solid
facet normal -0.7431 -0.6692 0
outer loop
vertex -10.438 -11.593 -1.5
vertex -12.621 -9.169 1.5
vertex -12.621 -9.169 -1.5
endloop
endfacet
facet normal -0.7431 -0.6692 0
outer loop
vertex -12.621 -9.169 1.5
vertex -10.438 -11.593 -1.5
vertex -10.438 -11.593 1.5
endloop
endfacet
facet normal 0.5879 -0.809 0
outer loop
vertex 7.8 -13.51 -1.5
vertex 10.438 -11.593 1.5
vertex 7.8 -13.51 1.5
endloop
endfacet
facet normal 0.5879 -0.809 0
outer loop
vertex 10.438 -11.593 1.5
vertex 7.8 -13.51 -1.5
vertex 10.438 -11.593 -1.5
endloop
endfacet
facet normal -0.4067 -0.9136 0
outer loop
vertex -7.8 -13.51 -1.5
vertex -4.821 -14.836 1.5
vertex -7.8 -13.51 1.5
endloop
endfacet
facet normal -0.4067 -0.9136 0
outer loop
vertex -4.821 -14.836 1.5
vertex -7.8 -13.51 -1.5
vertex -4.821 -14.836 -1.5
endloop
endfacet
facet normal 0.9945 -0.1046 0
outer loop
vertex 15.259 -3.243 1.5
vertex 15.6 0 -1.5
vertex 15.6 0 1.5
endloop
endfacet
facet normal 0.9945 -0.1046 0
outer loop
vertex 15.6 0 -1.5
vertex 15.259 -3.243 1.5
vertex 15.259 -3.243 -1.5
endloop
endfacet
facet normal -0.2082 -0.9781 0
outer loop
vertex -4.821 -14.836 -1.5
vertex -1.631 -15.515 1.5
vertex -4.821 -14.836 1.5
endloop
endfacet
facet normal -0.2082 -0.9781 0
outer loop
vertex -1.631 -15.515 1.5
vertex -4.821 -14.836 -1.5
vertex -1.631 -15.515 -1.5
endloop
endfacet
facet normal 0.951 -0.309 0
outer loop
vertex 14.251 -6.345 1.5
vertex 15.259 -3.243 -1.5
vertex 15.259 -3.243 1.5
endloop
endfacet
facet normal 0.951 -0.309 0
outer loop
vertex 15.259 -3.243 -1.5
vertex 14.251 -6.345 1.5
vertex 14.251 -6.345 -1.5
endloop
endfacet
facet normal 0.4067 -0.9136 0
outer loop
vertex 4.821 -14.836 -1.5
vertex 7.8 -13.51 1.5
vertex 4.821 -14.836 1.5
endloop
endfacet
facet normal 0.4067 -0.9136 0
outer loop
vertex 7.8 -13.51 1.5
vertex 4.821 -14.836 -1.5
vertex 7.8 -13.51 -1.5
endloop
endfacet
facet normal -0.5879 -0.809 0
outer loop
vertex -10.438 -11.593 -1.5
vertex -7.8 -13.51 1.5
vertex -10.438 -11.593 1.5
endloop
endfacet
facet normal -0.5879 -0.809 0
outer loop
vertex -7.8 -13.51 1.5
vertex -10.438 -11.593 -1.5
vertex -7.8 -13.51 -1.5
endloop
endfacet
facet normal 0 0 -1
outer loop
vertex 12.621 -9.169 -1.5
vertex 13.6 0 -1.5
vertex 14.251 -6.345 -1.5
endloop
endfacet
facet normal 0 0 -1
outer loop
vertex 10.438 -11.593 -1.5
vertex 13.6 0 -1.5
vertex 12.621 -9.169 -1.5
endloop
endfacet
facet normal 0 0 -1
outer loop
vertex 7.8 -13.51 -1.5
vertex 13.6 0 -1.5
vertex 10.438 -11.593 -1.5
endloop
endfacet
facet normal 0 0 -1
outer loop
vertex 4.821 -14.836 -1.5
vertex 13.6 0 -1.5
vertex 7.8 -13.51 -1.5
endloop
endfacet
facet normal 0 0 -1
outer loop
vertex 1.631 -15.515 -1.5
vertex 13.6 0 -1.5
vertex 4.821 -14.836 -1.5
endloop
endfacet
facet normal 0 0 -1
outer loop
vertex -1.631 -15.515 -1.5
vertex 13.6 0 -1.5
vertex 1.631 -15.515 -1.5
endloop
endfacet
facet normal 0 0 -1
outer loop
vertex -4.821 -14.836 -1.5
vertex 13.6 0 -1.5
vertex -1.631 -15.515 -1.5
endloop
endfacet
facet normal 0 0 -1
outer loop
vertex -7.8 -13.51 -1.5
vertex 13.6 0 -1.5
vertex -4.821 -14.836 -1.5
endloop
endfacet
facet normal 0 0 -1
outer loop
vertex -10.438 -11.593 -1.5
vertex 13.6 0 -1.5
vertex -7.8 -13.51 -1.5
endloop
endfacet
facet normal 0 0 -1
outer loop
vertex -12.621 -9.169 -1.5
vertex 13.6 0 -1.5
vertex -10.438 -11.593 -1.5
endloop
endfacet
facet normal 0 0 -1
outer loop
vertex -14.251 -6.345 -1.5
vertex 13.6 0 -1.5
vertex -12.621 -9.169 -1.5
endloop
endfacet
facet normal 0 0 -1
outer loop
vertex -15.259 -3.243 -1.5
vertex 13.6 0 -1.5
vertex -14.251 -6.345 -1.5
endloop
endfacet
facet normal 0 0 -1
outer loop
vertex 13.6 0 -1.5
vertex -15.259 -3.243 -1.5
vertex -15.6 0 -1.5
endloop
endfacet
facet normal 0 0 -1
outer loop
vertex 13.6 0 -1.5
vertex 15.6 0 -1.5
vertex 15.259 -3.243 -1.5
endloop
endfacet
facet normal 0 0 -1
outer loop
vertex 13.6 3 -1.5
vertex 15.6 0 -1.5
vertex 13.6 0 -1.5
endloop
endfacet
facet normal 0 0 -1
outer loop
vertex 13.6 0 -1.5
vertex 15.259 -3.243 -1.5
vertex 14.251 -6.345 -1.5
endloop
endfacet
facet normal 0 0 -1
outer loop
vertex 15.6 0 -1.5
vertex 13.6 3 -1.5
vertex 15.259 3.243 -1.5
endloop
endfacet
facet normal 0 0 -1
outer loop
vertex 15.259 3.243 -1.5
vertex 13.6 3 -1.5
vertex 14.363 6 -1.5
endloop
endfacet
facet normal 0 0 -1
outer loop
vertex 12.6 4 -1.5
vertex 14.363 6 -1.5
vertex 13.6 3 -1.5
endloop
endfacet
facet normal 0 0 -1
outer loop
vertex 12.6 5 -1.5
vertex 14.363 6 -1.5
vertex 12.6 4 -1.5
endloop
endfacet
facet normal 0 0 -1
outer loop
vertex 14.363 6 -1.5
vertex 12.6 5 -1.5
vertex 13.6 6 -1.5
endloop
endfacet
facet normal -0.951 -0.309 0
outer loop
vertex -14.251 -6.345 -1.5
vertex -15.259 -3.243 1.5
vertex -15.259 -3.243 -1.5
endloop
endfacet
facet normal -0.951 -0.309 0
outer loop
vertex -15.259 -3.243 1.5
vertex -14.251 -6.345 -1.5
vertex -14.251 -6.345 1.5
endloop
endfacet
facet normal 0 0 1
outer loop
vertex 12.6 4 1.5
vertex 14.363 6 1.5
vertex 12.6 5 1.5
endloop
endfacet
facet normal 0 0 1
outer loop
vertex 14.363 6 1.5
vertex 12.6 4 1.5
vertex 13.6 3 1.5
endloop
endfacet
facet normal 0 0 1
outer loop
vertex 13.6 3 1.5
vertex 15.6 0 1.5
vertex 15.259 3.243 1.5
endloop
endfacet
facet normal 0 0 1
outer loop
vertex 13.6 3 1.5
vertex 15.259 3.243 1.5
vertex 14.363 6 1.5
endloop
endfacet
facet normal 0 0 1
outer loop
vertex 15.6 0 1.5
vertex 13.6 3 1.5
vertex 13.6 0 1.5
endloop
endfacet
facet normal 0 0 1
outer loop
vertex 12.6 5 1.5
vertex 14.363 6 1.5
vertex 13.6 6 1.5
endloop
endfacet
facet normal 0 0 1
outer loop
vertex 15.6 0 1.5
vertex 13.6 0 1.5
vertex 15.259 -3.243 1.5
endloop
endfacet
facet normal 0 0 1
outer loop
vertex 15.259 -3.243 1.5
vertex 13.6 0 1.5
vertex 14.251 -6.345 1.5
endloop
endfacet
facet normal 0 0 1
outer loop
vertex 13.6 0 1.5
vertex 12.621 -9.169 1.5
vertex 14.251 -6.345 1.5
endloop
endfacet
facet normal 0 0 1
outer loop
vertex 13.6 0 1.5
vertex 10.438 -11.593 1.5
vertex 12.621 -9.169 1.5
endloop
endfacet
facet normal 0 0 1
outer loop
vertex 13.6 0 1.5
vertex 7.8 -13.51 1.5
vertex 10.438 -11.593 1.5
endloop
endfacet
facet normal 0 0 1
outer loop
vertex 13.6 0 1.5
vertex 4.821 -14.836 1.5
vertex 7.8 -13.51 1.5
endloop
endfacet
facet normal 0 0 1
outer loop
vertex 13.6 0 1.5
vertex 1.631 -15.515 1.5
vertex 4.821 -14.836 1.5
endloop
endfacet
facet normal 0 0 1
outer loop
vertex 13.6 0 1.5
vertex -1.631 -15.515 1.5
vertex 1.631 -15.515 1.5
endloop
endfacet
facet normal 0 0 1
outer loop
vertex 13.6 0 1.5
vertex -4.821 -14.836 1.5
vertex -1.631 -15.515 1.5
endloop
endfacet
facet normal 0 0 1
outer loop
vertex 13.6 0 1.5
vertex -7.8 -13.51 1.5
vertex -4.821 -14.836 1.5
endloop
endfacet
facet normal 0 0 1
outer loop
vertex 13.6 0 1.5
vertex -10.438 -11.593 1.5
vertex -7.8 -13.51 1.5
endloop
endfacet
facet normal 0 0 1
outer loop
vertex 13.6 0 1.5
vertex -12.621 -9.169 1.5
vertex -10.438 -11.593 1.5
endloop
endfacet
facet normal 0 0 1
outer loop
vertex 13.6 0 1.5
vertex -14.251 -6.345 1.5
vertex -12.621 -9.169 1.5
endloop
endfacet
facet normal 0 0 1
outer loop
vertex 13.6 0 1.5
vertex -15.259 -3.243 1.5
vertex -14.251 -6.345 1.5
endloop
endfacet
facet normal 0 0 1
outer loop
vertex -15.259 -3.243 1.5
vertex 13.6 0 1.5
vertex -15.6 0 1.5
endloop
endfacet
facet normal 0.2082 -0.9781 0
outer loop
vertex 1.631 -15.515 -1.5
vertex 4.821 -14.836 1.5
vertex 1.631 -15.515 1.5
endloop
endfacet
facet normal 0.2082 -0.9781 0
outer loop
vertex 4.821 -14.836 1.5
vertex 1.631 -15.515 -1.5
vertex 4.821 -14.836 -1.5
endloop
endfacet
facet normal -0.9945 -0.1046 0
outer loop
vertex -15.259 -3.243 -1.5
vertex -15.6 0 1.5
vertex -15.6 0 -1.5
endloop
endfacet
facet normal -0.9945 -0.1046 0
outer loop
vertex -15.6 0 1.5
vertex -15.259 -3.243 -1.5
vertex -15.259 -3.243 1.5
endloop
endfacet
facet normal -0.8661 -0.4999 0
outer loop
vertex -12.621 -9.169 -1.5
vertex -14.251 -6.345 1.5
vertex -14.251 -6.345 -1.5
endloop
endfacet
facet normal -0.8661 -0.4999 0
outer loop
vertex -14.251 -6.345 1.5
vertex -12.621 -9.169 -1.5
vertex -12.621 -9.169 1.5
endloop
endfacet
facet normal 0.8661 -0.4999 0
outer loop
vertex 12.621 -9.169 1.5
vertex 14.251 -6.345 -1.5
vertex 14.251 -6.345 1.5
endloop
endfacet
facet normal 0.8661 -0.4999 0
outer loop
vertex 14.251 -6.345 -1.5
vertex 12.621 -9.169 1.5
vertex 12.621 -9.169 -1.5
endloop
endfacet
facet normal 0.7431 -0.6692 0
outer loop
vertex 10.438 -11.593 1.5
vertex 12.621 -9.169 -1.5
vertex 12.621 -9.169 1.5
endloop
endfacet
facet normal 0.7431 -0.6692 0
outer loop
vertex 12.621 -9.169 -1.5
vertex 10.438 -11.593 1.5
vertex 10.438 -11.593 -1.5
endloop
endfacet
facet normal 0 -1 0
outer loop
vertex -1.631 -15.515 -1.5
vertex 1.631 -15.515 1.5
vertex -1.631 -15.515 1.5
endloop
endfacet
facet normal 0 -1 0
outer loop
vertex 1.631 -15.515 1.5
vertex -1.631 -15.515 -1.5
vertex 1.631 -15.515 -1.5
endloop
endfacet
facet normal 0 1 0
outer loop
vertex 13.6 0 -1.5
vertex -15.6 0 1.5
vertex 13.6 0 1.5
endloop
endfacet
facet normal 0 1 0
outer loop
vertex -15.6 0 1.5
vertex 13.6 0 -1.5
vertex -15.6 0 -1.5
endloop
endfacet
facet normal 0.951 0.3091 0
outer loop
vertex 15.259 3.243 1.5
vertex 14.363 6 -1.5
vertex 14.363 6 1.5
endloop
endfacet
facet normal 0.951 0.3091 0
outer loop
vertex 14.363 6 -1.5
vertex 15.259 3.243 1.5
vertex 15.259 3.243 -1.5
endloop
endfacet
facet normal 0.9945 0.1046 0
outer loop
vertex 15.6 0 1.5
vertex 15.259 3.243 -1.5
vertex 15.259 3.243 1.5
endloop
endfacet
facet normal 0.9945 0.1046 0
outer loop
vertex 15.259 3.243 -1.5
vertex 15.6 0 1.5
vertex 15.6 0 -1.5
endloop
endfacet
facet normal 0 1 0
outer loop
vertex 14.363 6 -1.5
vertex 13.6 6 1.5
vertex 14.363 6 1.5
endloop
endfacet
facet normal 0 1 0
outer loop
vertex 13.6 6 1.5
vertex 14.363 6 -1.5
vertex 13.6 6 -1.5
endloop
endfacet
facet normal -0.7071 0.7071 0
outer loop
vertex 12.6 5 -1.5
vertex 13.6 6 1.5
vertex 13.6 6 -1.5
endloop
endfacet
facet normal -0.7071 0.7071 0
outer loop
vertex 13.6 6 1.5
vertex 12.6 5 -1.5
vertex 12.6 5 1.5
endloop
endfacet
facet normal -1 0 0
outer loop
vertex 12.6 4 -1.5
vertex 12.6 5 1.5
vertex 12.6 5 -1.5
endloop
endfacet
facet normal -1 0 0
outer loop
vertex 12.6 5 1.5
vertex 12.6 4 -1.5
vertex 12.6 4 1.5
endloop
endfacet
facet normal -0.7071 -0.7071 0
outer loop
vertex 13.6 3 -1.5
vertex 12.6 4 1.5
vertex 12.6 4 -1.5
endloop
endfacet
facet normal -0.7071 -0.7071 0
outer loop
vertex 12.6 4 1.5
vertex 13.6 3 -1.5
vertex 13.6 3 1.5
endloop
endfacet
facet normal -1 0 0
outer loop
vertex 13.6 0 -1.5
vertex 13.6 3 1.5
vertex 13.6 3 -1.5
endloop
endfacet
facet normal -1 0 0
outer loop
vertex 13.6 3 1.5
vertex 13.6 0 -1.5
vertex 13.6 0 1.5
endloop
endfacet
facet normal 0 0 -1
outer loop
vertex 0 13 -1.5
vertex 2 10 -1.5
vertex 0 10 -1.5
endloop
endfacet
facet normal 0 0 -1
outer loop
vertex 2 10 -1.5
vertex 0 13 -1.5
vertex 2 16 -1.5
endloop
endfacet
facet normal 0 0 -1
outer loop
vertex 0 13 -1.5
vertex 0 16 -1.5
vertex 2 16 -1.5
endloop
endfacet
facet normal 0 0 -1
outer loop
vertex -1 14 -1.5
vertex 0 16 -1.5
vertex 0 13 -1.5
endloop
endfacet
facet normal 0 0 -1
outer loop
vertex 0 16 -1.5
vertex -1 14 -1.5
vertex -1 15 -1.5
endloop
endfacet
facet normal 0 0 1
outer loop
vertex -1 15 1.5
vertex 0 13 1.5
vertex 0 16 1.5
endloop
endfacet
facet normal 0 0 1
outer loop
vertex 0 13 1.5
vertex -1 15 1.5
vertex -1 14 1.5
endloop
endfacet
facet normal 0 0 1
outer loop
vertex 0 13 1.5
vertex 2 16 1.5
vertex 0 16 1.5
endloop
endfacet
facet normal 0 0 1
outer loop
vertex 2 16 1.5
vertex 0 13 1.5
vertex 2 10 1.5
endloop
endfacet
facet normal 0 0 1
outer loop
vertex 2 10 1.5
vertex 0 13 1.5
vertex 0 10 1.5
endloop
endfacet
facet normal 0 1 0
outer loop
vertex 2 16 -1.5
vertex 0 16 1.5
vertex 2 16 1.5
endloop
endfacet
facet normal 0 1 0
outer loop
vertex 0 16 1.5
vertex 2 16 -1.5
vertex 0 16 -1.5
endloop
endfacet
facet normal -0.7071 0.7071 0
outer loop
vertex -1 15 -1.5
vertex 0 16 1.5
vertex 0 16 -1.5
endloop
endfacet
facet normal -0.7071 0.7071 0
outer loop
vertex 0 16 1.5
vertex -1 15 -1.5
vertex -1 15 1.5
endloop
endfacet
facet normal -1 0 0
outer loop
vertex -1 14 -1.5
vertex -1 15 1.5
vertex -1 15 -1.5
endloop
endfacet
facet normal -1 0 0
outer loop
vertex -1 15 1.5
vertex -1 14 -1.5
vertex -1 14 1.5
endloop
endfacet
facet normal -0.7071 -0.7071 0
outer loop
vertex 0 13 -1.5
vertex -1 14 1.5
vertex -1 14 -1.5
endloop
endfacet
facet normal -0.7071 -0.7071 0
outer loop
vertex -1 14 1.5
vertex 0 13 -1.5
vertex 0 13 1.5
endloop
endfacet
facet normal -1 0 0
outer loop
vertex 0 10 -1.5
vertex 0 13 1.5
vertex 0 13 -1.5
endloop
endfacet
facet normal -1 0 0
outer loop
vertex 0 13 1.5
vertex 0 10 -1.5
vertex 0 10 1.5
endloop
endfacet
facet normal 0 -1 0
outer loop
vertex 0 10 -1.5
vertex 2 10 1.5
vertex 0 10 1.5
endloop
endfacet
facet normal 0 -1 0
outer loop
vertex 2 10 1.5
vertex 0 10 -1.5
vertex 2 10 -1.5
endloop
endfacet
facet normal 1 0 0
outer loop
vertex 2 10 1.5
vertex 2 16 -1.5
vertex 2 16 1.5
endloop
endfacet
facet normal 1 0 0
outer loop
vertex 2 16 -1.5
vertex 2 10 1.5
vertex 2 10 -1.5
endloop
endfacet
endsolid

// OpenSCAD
sheetWd=26;
sheetTh=3;
fudge=0.1;

//--- hook parametes --
a=2;
l=sheetTh;
d=1;

bevel=tan(45)*d;

translate([0,10,-sheetTh/2]) 
    linear_extrude(sheetTh) 
        polygon([[0,0],[0,l],[-d,l+bevel],[-d,l*2-bevel],[0,l*2],[a,l*2],[a,0]]);

difference(){
    cylinder(h=sheetTh,d=sheetWd*1.2,center=true);
    
    //cut half
    translate([-(sheetWd*1.2+fudge)/2, 0,-(sheetTh+fudge)/2]) cube([sheetWd*1.2+fudge,sheetWd*1.2/2+fudge,sheetTh+fudge]);
}

intersection(){
    cylinder(h=sheetTh,d=sheetWd*1.2,center=true);
    translate([sheetWd*1.2/2-a,0,-(sheetTh+fudge)/2])
   #    linear_extrude(sheetTh+fudge) 
        polygon([[0,0],[0,l],[-d,l+bevel],[-d,l*2-bevel],[0,l*2],[a,l*2],[a,0]]);
}
